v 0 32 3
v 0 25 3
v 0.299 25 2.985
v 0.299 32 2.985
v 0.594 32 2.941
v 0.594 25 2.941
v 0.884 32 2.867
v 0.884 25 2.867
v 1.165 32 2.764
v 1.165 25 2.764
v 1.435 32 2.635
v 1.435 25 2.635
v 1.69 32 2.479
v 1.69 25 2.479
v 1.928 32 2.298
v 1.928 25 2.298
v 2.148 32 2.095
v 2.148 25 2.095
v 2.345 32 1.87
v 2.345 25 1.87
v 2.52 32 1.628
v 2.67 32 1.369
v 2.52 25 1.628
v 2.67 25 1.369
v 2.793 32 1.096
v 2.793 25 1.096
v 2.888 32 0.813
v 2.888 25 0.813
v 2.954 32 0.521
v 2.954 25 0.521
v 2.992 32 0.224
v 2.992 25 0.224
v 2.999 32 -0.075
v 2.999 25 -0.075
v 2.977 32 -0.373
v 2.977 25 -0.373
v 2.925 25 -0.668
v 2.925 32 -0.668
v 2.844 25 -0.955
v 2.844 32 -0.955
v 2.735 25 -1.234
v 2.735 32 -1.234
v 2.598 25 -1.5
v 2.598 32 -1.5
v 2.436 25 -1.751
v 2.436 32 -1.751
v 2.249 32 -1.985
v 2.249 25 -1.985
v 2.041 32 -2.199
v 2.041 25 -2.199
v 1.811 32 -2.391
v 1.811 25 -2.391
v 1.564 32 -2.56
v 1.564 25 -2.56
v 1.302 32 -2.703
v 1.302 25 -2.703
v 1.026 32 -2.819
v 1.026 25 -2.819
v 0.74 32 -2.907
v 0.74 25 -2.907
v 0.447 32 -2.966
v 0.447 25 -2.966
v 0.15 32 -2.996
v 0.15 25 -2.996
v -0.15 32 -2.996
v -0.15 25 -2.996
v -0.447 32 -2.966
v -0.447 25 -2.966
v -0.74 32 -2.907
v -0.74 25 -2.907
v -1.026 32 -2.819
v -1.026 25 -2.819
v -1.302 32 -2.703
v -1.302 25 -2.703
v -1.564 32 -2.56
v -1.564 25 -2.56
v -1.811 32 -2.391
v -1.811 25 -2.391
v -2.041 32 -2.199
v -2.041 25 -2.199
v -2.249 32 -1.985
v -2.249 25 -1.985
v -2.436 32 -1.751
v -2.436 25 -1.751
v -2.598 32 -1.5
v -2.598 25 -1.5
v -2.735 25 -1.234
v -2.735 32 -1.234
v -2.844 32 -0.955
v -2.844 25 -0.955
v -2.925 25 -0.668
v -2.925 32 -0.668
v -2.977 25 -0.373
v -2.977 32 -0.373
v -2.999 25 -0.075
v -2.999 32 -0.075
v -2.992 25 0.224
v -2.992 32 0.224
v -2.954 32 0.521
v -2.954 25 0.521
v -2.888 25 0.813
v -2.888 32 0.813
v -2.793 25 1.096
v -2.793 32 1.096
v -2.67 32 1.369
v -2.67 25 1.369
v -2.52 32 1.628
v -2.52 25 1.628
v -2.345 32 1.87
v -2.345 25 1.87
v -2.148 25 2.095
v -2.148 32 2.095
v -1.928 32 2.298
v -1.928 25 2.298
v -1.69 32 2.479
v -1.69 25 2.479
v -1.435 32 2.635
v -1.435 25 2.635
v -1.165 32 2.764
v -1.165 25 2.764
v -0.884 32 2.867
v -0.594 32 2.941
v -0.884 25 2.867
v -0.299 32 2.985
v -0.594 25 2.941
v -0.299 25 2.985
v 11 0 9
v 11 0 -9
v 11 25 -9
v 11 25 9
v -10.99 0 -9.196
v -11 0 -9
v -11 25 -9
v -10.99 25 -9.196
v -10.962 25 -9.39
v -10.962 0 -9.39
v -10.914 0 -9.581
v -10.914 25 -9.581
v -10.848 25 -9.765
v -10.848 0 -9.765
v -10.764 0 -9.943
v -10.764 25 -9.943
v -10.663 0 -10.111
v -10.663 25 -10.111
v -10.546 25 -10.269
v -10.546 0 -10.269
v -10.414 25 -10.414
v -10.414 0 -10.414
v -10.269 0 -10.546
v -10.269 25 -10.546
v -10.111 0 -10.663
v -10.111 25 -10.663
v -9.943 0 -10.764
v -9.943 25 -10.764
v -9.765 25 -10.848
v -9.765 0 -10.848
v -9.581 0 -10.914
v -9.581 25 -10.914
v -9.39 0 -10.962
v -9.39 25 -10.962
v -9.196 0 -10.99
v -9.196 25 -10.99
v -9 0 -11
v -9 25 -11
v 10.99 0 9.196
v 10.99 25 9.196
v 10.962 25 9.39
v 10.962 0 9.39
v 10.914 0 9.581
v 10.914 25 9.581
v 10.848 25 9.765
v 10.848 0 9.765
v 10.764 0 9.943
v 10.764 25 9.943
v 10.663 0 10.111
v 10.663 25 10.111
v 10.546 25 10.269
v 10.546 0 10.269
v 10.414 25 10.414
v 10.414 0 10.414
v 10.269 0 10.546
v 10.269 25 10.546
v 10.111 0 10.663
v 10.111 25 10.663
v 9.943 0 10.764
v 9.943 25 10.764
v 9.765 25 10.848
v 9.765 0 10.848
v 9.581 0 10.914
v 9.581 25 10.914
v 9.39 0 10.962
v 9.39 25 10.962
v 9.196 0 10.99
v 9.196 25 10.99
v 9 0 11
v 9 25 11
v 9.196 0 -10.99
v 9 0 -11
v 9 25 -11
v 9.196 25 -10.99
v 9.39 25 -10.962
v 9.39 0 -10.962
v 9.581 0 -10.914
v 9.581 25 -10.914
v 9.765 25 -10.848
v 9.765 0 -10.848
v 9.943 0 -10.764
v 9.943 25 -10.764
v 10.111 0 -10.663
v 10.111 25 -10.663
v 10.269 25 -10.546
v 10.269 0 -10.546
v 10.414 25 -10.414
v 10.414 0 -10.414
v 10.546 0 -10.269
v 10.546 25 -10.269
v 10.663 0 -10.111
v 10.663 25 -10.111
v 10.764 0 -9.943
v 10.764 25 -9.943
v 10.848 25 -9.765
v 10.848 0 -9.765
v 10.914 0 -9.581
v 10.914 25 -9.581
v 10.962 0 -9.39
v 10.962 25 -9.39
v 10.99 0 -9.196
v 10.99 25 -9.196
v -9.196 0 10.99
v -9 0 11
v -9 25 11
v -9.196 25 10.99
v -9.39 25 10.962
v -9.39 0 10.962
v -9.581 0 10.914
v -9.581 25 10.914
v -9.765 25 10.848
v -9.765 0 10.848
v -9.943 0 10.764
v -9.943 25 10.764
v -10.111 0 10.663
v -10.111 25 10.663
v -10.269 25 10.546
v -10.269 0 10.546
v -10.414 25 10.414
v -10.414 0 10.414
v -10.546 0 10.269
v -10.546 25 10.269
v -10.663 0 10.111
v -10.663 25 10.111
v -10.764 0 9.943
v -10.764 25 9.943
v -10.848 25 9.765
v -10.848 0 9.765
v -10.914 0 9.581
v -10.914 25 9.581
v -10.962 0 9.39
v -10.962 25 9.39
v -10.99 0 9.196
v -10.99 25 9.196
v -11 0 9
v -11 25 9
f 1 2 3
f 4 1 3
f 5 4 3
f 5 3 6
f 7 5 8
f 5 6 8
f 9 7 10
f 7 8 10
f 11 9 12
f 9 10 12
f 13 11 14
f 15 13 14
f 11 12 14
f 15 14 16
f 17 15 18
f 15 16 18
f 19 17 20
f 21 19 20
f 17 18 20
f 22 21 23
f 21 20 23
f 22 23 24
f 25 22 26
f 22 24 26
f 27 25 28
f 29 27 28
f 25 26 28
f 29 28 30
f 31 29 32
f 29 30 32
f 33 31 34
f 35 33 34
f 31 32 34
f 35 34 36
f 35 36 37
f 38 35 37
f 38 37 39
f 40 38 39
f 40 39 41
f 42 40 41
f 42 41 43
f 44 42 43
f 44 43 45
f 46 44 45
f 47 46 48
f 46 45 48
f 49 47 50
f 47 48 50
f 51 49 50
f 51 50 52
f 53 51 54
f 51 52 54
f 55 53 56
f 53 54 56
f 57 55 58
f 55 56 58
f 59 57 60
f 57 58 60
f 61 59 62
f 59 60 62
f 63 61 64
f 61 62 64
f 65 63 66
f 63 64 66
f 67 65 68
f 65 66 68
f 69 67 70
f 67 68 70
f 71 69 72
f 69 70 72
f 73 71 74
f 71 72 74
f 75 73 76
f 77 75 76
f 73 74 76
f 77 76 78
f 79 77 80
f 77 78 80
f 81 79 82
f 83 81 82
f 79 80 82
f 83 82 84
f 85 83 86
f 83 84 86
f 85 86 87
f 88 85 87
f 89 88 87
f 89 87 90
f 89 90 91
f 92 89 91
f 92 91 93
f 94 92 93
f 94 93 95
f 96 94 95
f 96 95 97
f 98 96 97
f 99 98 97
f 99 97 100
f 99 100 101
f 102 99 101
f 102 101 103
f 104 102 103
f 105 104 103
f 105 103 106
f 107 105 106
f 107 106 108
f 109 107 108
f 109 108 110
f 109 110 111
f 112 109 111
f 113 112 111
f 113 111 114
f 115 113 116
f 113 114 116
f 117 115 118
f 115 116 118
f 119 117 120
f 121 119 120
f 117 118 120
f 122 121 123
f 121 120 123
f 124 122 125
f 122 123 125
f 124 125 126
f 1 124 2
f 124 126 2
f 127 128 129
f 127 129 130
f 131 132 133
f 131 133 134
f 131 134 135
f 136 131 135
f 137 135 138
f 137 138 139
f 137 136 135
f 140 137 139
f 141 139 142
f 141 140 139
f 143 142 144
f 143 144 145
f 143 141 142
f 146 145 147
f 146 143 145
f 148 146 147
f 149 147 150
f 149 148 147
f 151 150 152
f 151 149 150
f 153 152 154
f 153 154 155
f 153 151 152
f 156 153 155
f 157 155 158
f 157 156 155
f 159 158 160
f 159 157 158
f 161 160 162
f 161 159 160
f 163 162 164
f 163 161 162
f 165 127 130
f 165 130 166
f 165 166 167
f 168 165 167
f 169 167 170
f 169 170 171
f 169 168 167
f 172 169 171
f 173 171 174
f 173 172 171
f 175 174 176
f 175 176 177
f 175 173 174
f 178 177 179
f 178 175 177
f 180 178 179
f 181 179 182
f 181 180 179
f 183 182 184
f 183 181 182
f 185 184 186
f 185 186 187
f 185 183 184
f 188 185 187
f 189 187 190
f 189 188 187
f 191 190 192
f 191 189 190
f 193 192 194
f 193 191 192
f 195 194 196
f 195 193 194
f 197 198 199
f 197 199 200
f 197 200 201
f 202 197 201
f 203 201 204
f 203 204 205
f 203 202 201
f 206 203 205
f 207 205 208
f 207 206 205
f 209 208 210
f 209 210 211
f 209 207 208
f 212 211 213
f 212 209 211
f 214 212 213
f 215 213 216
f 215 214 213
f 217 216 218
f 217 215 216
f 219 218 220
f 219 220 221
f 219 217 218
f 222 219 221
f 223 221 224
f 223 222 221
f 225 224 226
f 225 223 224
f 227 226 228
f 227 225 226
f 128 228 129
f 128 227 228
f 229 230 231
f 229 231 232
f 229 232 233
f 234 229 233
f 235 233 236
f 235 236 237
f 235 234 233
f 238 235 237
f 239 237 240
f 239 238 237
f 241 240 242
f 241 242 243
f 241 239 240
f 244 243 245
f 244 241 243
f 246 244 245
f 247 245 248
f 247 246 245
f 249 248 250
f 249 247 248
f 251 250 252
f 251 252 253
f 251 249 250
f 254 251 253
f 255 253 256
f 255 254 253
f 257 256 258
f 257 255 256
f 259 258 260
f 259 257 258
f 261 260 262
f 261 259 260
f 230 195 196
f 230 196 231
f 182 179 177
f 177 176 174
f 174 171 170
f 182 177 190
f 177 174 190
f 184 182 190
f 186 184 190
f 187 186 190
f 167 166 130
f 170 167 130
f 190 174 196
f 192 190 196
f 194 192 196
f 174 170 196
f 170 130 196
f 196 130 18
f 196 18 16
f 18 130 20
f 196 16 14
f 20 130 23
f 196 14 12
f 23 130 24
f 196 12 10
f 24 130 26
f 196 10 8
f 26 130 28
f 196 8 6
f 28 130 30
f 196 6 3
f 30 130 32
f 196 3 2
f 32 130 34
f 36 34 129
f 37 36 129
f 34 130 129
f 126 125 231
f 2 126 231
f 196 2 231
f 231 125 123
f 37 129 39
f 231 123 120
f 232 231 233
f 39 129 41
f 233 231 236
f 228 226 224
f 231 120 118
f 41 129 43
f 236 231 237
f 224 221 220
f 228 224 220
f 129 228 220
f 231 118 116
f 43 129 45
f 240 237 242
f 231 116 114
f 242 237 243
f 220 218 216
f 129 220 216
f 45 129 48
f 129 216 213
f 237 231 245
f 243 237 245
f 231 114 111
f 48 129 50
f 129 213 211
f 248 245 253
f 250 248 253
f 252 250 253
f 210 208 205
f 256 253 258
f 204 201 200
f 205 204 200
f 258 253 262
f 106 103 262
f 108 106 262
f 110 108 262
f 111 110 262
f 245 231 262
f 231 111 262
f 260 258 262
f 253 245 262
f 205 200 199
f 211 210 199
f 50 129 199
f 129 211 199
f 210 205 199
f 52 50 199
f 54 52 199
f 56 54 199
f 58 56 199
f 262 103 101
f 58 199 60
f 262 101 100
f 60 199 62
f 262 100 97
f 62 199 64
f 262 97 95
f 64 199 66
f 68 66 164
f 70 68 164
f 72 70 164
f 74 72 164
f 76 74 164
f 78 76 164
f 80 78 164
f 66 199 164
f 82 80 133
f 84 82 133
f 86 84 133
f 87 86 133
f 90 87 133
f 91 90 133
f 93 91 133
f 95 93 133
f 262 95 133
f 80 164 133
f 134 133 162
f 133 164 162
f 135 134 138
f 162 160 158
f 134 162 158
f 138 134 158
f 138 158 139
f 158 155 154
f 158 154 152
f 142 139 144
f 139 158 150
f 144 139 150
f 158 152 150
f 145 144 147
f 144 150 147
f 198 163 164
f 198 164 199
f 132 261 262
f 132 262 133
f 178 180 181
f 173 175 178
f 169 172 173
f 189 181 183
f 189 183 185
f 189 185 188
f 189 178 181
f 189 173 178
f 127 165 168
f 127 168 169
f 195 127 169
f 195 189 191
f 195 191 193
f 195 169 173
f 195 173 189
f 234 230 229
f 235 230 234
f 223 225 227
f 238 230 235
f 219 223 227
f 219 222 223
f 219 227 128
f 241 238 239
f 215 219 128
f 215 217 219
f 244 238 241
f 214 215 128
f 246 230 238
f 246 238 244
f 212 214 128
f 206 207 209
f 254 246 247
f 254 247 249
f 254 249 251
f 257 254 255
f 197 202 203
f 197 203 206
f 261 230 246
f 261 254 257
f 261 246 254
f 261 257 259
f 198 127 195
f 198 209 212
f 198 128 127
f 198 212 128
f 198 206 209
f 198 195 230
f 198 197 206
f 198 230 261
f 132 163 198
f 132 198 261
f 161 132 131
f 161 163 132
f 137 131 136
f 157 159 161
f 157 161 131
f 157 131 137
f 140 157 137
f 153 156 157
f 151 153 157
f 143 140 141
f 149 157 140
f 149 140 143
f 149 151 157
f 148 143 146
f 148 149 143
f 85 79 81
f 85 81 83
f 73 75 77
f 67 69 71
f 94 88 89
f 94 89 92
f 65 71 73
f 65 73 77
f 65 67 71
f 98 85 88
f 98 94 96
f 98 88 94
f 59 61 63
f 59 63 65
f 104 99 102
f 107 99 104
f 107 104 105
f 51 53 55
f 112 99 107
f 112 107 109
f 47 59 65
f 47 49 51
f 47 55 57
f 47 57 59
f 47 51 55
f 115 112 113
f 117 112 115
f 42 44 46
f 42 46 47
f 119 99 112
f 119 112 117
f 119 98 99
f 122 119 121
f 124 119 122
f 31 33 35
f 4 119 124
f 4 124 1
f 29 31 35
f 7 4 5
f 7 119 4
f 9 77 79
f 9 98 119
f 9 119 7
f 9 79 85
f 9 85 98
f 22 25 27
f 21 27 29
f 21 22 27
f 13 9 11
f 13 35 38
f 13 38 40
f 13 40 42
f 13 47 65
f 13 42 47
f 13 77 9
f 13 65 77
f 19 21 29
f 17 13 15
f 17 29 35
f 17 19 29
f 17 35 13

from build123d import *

# Parameters (mm, degrees)
SKETCH1_R           = 6
BOSS_EXTRUDE1_DEPTH = 25
SKETCH2_R           = 3
BOSS_EXTRUDE2_DEPTH = 7


with BuildPart() as part:
    # Sketch1 → Boss-Extrude1 (new body)
    with BuildSketch(Plane(origin=(0, 0, 0), x_dir=(1, 0, 0), z_dir=(0, 1, 0))):
        with BuildLine():
            ThreePointArc((-11, 9), (-10.414213562, 10.414213562), (-9, 11))
            Line((-9, 11), (9, 11))
            ThreePointArc((9, 11), (10.414213562, 10.414213562), (11, 9))
            Line((11, 9), (11, -9))
            ThreePointArc((11, -9), (10.414213562, -10.414213562), (9, -11))
            Line((9, -11), (-9, -11))
            ThreePointArc((-9, -11), (-10.414213562, -10.414213562), (-11, -9))
            Line((-11, -9), (-11, 9))
        make_face()
        Circle(SKETCH1_R, mode=Mode.SUBTRACT)
        Circle(SKETCH1_R)
    extrude(amount=BOSS_EXTRUDE1_DEPTH)

    # Sketch2 → Boss-Extrude2 (add)
    with BuildSketch(Plane(origin=(0, 25, 0), x_dir=(1, 0, 0), z_dir=(0, 1, 0))):
        with Locations(Location((0, 0, 0), (0, 0, 270))):
            Circle(SKETCH2_R)
    extrude(amount=BOSS_EXTRUDE2_DEPTH)


solid = part.part
